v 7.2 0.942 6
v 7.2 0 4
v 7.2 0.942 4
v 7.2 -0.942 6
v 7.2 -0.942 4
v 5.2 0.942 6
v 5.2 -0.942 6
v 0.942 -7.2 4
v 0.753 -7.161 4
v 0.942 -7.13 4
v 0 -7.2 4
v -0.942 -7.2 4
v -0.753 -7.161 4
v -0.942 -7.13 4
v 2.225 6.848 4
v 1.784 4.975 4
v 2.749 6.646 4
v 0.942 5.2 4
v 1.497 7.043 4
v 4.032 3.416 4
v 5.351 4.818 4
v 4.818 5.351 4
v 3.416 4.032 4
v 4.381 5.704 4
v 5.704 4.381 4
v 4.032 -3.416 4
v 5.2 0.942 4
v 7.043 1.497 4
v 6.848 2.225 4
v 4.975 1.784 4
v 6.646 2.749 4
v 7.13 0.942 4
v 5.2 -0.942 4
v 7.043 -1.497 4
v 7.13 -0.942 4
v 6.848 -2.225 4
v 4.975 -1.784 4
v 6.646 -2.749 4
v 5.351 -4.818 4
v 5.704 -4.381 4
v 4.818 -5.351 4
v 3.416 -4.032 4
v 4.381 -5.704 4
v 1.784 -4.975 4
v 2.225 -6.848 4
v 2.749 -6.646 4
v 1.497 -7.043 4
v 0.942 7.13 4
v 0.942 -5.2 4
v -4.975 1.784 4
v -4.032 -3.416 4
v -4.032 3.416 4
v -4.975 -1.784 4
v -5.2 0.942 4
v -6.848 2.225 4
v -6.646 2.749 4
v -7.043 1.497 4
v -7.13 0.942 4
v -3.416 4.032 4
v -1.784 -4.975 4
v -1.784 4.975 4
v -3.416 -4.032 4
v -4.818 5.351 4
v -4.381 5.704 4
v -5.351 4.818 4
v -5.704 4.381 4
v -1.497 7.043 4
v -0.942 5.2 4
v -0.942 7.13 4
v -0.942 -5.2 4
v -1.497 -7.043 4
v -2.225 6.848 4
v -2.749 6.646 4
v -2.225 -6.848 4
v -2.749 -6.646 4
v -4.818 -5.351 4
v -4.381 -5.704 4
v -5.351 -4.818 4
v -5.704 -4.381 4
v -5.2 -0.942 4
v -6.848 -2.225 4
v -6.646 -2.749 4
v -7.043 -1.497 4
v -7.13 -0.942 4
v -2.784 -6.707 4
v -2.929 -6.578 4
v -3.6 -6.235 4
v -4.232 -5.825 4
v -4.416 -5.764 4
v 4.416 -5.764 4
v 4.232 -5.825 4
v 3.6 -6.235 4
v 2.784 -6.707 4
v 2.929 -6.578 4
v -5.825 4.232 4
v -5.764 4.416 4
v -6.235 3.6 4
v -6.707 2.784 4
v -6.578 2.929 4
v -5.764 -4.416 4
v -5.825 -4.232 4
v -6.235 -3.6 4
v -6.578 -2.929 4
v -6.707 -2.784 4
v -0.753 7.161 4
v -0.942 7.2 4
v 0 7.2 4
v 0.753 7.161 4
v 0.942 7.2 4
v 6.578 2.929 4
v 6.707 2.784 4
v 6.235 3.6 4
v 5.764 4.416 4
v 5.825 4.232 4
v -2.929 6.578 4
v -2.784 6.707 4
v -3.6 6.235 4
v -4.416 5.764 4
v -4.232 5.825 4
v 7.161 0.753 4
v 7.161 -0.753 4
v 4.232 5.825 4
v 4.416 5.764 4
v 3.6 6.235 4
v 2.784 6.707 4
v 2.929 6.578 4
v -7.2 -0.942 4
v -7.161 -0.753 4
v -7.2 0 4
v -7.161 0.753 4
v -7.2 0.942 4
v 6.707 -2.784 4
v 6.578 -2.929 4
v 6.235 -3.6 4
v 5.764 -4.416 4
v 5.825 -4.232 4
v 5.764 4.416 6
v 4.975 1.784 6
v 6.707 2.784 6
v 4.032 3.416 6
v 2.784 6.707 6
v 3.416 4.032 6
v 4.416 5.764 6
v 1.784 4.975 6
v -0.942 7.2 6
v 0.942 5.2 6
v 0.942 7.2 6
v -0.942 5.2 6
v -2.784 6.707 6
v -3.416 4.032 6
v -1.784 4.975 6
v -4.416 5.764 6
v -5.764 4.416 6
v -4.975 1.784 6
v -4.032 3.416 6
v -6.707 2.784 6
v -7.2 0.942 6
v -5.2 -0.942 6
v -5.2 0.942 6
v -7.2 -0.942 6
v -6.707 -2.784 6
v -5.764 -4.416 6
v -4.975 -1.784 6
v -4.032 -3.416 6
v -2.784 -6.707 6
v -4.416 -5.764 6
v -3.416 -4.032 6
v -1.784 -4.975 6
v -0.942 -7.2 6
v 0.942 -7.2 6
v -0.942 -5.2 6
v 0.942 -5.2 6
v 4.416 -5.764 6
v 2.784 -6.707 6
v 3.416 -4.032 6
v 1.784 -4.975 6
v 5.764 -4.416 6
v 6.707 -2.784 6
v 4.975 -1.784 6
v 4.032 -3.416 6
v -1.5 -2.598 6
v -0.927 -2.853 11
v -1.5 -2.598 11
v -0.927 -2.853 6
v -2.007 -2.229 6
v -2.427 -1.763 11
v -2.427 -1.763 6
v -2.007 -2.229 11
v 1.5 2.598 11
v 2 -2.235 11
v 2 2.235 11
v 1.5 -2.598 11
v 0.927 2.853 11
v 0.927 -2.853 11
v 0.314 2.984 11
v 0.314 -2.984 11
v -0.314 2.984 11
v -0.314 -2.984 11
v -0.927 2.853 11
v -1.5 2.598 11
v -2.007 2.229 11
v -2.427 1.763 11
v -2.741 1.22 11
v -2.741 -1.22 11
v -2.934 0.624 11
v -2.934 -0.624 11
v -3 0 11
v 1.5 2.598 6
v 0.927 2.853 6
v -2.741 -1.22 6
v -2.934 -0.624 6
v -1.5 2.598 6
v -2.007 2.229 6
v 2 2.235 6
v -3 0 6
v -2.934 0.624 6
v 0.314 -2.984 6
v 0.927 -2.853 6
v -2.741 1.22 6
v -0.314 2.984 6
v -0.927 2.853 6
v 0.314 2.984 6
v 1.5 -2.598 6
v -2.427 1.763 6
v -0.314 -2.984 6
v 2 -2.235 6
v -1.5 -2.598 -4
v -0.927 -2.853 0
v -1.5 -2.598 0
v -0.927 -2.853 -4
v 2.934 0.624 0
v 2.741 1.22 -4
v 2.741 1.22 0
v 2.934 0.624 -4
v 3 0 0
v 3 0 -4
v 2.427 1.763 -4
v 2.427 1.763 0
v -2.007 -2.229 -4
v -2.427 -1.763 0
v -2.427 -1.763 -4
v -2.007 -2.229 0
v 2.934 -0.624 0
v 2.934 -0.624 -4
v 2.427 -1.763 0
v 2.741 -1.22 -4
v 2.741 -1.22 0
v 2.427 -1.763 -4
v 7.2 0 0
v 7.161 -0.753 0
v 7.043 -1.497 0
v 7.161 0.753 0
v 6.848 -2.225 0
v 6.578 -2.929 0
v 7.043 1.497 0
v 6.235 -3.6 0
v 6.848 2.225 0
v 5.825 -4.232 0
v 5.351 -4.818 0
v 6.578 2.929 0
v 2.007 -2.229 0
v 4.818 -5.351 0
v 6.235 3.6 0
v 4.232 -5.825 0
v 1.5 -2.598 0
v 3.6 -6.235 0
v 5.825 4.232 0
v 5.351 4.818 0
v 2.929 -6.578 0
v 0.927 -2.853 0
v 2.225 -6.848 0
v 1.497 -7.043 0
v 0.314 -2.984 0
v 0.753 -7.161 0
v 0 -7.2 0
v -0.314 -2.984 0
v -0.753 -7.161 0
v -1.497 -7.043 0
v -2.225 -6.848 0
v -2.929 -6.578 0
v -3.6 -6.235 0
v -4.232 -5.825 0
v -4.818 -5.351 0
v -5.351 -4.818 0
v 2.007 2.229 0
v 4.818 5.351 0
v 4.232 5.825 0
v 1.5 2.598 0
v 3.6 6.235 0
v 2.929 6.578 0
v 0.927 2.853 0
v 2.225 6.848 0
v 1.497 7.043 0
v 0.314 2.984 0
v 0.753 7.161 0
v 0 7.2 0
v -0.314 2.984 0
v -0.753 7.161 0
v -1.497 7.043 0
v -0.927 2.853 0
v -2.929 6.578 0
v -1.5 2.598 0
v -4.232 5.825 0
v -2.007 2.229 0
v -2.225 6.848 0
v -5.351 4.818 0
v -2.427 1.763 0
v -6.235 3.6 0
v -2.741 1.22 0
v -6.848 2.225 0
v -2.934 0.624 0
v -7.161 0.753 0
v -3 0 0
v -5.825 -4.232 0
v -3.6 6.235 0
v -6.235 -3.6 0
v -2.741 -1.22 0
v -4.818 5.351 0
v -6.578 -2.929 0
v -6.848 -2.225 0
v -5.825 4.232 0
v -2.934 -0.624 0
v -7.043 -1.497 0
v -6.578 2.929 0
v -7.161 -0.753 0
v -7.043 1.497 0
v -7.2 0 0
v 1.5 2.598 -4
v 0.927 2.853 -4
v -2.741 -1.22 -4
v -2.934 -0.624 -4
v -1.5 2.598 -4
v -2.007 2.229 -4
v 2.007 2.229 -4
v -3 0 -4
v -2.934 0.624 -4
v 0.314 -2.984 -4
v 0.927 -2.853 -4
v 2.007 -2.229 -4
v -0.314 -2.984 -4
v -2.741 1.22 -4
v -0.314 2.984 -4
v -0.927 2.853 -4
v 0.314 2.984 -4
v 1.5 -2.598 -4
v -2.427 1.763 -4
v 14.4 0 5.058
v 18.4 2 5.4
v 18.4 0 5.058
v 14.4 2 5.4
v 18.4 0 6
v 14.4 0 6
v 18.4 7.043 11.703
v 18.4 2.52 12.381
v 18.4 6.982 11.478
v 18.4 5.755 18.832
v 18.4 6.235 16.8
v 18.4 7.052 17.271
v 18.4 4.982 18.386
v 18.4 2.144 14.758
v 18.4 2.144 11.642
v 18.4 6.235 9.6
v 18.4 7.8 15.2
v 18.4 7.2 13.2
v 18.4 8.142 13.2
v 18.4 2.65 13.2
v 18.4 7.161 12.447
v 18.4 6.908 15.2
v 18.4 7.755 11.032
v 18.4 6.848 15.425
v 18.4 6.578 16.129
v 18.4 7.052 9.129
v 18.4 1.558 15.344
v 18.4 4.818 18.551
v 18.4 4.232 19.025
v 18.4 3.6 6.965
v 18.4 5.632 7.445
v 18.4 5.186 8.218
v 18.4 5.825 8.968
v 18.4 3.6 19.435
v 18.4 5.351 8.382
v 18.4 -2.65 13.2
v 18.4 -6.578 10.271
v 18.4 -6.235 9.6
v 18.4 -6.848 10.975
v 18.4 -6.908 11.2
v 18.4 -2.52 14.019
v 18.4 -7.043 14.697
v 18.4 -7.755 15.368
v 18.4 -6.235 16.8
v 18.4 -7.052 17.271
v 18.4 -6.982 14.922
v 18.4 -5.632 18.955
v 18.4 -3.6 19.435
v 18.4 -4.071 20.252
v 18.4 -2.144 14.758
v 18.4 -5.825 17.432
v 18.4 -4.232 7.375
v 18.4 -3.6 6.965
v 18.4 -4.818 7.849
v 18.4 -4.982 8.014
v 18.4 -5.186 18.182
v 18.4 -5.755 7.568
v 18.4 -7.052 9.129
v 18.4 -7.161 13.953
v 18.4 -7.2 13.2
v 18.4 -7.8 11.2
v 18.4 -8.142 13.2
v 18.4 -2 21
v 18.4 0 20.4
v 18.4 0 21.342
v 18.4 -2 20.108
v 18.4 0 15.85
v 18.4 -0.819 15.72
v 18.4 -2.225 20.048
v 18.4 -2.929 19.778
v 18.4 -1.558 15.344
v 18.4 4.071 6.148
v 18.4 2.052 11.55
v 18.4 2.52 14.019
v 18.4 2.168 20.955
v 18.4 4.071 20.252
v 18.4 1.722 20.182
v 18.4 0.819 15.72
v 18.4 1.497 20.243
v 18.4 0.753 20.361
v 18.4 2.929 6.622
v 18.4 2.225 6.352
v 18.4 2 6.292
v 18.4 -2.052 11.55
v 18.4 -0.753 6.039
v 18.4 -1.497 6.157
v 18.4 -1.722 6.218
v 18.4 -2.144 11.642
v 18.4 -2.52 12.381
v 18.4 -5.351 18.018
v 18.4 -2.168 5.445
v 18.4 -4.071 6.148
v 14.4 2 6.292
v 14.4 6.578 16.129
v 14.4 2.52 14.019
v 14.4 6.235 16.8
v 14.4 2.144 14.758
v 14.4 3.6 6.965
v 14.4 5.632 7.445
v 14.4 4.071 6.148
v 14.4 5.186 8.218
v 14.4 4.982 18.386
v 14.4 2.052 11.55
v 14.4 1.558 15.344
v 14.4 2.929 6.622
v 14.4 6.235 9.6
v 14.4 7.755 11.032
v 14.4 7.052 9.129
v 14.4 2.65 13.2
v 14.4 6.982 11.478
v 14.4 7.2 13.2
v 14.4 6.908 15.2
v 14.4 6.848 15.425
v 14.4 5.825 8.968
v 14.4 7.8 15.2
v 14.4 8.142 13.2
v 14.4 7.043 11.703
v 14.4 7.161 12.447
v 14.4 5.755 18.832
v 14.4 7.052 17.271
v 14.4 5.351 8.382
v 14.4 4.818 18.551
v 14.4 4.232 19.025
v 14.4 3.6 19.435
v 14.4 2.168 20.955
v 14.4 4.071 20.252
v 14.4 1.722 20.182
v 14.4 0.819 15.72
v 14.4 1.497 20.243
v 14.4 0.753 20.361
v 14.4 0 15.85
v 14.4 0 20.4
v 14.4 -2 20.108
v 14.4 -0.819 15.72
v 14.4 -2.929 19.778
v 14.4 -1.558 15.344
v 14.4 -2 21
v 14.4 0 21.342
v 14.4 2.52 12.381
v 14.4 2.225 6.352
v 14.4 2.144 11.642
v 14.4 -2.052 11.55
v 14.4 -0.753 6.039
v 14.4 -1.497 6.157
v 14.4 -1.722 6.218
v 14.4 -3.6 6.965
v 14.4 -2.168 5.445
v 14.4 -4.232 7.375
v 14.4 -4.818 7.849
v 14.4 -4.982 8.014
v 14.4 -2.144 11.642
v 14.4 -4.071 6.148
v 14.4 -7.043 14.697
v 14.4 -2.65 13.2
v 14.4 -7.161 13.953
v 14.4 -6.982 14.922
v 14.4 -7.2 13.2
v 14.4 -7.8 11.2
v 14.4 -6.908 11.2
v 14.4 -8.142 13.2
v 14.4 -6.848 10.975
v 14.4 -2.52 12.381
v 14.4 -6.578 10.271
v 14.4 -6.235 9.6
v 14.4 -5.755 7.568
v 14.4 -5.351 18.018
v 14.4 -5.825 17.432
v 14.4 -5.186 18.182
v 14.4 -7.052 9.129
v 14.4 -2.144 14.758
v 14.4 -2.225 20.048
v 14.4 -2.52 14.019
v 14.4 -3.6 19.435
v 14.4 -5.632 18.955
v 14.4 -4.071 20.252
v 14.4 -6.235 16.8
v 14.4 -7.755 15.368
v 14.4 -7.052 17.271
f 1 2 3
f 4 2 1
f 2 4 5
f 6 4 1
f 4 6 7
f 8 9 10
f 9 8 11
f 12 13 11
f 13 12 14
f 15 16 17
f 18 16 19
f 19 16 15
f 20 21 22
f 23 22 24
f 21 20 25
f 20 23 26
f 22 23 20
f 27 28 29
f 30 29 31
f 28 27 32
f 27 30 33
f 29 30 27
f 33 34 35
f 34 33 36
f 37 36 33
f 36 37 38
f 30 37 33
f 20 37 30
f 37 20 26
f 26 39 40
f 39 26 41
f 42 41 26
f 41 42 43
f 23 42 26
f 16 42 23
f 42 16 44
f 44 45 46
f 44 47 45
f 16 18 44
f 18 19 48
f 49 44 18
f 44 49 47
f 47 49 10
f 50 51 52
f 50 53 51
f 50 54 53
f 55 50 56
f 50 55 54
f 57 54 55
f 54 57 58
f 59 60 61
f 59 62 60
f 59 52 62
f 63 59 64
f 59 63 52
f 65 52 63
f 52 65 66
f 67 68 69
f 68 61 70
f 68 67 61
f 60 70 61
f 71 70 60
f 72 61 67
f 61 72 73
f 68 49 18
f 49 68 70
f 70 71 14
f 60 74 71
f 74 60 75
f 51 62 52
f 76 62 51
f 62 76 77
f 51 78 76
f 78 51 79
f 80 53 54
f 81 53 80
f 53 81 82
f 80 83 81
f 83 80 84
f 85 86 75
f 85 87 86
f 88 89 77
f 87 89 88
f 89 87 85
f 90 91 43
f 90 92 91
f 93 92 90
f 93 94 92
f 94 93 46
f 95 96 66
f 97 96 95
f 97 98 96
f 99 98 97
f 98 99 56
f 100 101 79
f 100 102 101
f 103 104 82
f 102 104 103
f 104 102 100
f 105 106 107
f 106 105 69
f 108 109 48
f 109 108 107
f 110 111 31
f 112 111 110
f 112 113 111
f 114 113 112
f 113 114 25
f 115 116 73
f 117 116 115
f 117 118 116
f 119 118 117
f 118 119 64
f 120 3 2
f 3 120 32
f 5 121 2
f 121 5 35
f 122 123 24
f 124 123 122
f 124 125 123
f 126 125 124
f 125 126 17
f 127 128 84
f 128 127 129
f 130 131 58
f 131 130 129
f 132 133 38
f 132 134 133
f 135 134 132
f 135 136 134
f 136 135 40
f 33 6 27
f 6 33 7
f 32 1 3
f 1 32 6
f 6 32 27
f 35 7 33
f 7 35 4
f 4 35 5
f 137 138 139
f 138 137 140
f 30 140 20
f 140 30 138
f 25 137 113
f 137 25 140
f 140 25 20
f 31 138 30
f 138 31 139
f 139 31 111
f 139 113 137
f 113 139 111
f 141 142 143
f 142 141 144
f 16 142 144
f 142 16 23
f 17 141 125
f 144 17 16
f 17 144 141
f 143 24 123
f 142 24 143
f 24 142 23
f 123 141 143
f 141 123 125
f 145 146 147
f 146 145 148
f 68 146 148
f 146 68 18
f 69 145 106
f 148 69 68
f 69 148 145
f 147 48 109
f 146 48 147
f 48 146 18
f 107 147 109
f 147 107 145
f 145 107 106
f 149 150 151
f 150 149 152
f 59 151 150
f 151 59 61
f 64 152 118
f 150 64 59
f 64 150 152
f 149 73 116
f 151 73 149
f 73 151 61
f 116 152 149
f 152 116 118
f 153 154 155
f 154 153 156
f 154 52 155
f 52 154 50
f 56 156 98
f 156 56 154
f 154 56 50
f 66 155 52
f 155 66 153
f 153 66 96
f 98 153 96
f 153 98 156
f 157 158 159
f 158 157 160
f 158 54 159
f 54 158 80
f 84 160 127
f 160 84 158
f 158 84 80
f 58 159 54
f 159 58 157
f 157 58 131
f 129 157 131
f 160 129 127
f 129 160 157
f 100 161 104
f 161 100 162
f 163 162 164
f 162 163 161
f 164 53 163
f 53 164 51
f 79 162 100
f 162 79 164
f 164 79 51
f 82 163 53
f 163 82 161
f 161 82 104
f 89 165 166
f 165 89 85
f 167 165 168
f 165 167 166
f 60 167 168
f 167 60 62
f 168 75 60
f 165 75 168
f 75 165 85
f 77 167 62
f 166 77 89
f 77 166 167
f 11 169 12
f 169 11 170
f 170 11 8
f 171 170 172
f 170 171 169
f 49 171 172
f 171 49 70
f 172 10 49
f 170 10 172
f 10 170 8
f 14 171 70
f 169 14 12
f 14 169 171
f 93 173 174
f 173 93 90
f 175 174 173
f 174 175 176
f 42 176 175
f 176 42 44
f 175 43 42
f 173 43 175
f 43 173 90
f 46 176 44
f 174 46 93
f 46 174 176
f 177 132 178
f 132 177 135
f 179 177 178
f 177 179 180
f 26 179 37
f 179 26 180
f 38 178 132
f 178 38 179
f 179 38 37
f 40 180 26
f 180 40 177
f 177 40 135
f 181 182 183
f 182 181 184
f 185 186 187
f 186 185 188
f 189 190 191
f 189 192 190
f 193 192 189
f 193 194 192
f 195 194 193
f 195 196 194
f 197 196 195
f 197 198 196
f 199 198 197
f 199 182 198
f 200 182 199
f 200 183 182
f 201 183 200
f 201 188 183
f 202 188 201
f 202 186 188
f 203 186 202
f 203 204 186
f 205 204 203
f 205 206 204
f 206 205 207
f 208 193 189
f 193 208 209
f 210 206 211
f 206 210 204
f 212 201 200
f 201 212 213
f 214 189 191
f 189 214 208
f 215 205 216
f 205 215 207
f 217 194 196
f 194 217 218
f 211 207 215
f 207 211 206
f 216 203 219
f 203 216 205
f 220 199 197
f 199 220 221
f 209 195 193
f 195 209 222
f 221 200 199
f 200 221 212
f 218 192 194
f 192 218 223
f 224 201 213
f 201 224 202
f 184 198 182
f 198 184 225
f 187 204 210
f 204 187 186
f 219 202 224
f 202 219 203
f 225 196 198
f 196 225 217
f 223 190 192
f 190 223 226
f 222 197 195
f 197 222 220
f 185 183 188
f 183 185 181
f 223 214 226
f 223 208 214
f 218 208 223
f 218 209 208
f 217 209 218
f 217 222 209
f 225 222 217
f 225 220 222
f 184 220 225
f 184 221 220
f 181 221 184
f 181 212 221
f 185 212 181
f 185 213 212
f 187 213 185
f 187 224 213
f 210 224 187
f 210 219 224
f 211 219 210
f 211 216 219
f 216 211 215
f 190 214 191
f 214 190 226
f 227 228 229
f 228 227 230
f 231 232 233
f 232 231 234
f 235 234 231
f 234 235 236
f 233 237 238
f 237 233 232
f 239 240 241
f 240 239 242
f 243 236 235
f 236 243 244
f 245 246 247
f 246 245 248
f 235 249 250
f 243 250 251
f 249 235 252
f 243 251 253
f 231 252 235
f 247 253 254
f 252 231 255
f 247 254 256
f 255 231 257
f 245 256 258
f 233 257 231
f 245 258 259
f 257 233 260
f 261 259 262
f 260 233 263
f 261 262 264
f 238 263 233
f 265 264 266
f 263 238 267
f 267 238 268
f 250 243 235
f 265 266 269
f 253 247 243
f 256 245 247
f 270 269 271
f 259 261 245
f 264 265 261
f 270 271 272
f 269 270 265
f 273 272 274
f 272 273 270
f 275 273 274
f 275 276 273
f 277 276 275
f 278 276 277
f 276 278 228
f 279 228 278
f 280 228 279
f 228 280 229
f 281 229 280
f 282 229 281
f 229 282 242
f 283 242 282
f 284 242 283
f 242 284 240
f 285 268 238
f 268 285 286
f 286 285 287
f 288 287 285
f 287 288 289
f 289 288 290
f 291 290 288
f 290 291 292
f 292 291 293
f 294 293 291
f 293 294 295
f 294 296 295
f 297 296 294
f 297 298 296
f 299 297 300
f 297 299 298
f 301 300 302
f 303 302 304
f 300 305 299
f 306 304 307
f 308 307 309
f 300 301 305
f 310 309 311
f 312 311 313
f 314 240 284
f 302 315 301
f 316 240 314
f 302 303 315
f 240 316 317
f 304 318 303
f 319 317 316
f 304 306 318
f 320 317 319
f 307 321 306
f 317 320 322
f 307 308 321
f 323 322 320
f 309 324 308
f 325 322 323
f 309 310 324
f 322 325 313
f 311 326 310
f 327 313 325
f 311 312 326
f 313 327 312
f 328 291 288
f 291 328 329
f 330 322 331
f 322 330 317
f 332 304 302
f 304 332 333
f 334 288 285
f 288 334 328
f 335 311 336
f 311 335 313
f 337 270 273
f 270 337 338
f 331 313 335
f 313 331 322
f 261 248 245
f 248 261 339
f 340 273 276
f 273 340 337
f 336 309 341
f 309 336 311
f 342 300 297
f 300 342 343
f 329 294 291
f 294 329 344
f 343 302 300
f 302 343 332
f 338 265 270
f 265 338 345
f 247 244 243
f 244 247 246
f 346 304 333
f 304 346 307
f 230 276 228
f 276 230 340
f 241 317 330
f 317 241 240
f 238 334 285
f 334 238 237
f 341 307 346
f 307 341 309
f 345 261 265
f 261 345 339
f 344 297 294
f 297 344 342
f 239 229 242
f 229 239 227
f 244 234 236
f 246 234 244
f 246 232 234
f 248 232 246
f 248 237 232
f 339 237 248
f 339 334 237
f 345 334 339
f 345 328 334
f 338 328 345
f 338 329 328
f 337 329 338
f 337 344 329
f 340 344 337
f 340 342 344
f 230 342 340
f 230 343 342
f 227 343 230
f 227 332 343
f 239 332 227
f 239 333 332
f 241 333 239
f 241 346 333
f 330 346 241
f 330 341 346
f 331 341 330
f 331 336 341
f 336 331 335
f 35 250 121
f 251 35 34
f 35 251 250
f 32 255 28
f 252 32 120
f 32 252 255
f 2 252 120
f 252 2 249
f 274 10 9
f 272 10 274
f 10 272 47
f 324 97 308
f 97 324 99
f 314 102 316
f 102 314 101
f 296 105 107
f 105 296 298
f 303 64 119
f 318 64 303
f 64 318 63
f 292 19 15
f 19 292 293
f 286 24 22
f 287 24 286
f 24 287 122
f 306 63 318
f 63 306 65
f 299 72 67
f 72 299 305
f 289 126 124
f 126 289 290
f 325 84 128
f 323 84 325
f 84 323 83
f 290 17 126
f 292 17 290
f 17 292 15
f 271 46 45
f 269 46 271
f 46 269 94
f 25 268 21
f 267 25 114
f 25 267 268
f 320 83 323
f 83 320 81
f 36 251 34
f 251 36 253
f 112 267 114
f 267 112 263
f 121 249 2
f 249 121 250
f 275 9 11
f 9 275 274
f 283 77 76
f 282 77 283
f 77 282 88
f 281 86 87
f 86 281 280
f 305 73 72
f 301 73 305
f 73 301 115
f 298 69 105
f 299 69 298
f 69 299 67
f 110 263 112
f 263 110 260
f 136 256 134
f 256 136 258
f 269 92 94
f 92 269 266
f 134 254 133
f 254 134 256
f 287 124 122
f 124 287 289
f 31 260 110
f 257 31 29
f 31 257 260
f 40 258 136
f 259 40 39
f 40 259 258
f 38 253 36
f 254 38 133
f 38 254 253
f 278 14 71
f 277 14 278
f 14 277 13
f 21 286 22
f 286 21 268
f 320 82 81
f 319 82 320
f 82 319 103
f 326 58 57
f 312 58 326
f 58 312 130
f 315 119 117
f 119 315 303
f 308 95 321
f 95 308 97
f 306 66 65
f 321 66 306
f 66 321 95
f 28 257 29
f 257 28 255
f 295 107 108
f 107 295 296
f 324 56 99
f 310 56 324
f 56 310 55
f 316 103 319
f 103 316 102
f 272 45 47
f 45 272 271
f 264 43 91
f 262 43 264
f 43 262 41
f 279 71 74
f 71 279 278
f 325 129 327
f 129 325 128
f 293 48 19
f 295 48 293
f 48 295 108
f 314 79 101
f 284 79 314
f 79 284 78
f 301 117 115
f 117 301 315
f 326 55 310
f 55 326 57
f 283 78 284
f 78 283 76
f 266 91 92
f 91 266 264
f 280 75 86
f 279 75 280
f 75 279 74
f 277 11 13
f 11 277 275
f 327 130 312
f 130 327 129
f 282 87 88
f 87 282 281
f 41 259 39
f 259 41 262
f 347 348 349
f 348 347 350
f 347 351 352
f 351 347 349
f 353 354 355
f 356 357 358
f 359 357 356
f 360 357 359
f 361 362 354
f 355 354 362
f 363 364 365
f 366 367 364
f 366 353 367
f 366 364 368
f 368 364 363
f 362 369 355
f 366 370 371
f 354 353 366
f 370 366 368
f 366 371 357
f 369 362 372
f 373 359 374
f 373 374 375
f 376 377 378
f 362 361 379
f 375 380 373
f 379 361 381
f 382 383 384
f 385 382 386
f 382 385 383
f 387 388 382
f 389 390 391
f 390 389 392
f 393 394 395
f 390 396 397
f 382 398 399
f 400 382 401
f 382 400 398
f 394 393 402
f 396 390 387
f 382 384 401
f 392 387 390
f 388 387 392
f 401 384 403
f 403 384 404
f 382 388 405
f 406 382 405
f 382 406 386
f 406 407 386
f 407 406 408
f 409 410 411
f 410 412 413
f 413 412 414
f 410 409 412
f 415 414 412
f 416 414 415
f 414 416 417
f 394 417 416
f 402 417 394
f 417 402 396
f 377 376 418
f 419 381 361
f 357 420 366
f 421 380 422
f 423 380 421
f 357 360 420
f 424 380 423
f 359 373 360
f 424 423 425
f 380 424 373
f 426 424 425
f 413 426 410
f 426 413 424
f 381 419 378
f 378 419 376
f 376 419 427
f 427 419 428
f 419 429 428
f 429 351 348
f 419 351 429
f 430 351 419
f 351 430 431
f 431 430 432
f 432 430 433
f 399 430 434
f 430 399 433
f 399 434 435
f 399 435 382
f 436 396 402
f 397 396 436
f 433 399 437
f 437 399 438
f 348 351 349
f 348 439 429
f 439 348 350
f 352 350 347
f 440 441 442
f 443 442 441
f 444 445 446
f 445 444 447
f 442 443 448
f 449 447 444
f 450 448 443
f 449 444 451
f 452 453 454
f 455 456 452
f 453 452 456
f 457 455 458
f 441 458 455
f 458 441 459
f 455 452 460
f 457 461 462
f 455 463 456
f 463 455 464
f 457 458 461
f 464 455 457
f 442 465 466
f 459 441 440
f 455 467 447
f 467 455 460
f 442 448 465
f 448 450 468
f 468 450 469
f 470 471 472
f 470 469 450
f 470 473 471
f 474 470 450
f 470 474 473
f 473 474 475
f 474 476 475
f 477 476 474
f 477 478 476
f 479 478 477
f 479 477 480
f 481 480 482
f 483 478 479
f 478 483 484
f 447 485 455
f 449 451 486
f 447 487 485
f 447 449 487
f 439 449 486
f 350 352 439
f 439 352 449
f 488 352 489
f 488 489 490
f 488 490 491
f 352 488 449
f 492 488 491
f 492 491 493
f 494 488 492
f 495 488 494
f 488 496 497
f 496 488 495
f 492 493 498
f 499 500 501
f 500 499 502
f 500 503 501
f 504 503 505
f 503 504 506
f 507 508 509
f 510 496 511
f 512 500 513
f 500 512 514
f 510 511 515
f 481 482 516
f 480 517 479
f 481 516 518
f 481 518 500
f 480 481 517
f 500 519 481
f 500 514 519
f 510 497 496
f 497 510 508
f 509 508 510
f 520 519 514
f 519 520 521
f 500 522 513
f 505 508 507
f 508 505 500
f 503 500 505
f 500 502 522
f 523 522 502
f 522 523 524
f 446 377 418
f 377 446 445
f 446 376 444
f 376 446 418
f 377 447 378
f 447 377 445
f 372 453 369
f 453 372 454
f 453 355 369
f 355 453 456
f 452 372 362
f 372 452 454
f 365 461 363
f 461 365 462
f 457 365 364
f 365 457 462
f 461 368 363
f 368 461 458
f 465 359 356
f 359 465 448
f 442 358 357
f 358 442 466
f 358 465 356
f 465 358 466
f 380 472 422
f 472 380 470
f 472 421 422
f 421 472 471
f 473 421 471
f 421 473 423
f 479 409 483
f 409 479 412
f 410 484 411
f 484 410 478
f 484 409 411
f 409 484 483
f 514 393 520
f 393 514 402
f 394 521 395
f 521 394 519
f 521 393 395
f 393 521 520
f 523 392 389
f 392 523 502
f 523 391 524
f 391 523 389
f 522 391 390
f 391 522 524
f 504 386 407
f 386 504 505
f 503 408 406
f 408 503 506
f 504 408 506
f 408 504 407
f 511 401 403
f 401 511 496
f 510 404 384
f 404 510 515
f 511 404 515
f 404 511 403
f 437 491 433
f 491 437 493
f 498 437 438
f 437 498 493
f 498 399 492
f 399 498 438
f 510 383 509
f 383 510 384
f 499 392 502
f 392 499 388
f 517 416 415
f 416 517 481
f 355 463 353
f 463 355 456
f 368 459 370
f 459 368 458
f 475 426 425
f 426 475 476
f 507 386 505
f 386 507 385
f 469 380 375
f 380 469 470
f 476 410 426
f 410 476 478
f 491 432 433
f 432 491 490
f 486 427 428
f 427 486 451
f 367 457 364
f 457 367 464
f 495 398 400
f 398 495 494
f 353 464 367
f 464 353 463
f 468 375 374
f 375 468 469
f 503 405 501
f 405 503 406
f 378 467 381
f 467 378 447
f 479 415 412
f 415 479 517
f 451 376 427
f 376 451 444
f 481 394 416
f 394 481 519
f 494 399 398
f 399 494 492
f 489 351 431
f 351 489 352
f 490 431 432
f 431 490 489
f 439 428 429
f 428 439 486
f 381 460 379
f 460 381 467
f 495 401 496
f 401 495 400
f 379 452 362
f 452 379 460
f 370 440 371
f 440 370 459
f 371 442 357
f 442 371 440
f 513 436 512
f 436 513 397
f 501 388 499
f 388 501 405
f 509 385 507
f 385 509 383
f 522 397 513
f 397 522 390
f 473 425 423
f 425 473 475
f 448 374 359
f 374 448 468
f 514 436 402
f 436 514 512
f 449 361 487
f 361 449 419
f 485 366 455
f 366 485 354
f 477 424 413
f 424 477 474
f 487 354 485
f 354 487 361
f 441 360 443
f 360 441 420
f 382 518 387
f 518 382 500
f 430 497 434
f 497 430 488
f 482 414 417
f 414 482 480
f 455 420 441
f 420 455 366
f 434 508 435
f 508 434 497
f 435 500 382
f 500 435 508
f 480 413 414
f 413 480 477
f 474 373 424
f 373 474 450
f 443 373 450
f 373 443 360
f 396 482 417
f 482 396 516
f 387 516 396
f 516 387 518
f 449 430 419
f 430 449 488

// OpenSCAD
use <carousel.scad>

// Crown gear flat, teeth up
crown_gear();

// Spur gear: rotated 90 so its flat face is vertical
gear_r = 12 * 1.2 / 2;  // 7.2mm
tooth_h = 2;
gear_th = 4;

translate([gear_r + gear_r, 0, gear_th + tooth_h + gear_r])
    rotate([0, 90, 0])
        spur_gear();
